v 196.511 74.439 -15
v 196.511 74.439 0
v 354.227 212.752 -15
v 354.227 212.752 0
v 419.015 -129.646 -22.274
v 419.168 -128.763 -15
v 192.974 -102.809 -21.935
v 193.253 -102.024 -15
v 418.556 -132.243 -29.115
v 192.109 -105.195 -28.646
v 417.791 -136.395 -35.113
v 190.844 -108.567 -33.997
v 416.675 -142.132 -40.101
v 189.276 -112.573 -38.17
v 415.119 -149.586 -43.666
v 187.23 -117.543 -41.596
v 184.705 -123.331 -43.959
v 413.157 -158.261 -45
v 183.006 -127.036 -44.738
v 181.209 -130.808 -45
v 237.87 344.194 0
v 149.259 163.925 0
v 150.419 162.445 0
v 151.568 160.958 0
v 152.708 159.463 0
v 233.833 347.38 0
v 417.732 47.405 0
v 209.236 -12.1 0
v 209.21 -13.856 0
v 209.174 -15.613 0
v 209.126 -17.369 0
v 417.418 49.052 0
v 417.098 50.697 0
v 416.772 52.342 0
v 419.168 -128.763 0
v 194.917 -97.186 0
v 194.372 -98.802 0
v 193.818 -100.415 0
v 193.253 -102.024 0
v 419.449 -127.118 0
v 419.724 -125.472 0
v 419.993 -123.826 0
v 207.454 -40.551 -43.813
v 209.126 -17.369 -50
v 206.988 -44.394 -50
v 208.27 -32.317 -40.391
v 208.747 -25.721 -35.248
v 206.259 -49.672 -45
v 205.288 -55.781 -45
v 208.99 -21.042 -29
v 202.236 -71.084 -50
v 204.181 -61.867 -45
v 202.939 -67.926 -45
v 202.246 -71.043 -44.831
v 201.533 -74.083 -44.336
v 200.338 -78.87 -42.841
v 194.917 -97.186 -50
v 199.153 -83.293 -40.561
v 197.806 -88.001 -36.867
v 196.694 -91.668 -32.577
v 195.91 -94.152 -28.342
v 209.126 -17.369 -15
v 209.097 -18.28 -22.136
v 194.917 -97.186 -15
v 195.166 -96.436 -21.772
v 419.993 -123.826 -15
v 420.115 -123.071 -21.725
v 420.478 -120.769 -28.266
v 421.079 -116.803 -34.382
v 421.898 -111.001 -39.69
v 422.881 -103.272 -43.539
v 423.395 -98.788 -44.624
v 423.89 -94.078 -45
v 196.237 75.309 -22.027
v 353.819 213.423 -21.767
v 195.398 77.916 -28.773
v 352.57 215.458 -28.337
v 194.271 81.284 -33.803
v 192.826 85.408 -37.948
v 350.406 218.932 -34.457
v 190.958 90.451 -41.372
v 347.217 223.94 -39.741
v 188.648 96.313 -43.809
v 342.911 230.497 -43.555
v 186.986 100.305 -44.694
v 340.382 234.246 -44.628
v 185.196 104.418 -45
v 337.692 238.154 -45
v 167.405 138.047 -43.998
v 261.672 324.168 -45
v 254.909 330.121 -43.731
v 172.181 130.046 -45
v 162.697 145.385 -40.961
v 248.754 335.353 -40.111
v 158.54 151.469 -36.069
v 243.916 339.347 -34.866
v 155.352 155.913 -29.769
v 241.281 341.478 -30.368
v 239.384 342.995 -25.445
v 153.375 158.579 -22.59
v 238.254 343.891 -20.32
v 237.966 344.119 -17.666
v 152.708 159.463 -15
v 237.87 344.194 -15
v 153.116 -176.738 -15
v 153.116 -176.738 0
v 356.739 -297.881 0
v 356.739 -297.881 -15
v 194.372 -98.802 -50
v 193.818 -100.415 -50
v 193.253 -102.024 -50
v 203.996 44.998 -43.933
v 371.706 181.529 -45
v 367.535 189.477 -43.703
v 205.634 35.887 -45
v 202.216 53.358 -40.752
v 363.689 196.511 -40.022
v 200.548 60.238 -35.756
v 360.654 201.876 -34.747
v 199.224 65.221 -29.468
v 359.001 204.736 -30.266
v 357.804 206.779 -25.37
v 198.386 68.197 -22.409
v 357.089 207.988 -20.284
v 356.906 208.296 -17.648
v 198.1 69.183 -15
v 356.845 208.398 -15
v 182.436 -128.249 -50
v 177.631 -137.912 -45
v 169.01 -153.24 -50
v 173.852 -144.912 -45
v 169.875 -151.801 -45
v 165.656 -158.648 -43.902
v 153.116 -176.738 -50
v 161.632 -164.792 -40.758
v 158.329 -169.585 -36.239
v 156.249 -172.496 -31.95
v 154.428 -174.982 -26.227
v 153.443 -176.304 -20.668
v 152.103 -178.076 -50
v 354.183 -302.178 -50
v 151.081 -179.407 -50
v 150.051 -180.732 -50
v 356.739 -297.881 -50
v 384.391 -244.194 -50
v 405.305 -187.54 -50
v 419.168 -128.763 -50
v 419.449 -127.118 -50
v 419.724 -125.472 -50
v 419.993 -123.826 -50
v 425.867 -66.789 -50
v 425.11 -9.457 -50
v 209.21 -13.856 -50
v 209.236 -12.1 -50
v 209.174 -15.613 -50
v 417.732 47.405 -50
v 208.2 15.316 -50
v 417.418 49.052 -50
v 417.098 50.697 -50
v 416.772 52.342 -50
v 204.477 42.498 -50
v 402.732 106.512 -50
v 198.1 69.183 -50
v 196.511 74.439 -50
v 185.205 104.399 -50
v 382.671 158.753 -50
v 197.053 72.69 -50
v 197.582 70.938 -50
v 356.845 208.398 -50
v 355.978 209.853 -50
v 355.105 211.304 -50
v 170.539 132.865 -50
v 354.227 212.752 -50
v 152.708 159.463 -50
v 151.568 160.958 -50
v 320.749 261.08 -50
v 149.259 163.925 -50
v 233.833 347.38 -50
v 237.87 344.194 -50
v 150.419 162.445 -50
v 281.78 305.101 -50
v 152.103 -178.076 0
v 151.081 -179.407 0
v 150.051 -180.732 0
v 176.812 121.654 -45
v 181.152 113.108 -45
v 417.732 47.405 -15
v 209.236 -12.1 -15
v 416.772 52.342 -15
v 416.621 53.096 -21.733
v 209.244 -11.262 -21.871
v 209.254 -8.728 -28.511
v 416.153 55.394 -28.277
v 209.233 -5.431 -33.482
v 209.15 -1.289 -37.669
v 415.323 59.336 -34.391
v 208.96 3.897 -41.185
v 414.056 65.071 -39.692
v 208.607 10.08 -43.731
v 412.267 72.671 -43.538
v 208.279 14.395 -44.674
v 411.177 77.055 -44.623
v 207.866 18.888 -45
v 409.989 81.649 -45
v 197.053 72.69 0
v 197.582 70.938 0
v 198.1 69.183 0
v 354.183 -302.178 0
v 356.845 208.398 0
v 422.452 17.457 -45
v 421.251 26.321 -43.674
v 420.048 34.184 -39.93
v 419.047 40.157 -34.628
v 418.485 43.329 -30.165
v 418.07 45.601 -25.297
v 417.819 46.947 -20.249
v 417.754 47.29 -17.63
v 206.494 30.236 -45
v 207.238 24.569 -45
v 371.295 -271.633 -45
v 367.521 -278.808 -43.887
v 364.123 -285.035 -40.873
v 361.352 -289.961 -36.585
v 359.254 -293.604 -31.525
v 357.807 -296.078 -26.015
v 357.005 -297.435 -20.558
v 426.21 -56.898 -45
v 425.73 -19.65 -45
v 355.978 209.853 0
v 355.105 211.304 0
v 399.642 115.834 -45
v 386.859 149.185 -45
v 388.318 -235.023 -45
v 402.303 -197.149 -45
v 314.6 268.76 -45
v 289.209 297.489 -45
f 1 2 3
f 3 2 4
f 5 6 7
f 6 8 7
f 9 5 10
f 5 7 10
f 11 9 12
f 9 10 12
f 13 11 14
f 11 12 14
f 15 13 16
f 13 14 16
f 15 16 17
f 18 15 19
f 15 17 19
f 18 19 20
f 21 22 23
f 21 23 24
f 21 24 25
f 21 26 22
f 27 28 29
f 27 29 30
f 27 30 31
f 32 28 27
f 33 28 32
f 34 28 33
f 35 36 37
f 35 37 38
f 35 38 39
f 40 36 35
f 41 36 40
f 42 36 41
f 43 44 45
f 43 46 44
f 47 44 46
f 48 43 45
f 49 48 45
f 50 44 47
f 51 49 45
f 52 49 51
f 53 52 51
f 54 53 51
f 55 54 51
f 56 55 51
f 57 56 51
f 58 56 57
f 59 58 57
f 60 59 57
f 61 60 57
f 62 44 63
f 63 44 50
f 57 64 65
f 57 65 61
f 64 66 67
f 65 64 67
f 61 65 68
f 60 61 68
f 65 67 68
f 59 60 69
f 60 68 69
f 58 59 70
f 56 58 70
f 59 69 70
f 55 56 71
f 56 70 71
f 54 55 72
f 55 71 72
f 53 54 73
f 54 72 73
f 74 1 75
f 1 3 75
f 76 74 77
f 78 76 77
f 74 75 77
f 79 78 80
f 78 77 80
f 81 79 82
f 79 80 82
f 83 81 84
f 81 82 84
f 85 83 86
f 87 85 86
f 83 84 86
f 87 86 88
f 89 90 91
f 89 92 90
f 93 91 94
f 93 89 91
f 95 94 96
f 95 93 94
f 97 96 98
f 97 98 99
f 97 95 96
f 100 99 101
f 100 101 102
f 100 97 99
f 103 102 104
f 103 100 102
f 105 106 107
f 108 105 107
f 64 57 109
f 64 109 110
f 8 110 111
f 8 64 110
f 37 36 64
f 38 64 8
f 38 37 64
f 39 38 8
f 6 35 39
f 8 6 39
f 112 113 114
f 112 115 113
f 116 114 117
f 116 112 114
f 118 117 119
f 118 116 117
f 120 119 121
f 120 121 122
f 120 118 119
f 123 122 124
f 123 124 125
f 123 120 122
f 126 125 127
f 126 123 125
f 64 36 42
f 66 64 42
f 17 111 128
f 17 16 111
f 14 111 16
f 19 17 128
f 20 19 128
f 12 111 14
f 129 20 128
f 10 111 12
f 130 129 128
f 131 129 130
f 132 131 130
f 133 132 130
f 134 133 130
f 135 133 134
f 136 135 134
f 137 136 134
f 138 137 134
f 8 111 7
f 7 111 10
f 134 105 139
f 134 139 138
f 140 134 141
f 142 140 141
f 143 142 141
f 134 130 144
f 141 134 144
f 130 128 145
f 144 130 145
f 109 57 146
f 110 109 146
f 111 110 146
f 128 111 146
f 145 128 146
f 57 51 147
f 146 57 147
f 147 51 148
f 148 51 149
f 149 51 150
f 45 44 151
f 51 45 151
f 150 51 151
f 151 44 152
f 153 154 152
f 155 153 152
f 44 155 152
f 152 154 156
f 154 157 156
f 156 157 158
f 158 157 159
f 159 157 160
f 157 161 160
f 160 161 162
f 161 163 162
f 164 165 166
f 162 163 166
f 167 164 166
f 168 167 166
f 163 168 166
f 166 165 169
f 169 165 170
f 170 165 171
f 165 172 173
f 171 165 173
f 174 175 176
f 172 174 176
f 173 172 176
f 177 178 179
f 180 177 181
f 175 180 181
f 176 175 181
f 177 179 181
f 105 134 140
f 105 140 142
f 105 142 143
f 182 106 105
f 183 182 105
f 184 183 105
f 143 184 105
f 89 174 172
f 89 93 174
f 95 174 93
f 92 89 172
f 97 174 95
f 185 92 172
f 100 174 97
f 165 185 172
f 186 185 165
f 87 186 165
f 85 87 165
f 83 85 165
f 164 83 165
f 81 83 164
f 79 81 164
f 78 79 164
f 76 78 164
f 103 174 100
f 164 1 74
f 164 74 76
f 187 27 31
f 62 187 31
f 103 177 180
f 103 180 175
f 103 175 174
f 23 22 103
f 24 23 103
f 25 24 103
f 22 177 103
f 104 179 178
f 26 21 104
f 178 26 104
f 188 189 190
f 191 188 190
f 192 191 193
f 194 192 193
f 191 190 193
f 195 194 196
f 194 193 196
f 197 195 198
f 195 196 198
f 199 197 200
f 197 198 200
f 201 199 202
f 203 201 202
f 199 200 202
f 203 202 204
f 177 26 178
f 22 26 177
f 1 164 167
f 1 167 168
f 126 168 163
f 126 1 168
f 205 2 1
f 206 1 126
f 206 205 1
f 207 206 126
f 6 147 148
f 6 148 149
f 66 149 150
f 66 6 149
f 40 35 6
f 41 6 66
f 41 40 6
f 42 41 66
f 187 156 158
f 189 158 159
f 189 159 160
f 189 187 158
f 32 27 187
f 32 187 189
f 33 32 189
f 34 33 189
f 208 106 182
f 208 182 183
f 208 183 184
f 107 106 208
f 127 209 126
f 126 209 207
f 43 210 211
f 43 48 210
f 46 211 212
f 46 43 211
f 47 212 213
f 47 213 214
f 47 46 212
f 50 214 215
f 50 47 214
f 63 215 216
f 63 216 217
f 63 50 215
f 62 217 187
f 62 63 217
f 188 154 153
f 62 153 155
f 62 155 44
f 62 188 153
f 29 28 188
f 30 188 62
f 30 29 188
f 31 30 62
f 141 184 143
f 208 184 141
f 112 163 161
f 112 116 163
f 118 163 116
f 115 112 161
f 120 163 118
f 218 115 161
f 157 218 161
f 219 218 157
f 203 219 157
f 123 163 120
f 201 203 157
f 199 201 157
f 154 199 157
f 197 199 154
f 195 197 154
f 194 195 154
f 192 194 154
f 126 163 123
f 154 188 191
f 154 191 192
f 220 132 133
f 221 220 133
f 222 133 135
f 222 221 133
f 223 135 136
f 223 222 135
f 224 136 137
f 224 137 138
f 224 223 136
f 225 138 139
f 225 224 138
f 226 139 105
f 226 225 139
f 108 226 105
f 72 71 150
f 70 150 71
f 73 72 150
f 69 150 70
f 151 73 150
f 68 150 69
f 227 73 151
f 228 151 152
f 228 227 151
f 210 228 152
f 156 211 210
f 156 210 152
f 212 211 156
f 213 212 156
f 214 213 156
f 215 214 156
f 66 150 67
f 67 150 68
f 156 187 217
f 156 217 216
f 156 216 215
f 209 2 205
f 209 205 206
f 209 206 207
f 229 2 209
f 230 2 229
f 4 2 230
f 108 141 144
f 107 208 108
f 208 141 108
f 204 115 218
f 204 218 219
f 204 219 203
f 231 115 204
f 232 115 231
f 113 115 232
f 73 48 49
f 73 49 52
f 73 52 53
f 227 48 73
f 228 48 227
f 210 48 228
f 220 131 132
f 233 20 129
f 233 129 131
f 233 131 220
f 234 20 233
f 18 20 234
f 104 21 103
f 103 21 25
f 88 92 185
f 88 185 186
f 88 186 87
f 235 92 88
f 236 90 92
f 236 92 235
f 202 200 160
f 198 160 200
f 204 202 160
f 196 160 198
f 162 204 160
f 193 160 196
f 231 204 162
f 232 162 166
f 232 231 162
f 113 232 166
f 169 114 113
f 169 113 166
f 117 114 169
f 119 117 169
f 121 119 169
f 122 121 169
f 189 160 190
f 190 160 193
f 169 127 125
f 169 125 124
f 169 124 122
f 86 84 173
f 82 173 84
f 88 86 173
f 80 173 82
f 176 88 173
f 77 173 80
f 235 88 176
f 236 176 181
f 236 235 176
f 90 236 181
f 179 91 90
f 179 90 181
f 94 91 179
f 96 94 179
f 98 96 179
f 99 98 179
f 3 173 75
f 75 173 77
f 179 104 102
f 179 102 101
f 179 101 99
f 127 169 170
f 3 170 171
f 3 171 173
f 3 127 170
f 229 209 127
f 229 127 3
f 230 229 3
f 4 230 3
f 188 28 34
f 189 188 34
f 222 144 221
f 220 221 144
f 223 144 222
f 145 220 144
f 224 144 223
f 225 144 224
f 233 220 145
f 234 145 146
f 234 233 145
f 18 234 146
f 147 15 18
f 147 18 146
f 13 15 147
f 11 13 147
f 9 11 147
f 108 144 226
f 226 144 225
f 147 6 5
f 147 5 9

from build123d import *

# Parameters (mm, degrees)
F1_DEPTH = 50
F2_DEPTH = 45
F3_R     = 30


with BuildPart() as f1:
    # F0 (on Top) → F1 (new body)
    with BuildSketch(Plane.XY):
        with BuildLine():
            ThreePointArc((194.916758, -97.186199), (194.096086, -99.609017), (193.25323, -102.024207))
            Line((193.25323, -102.024207), (419.168146, -128.763))
            ThreePointArc((419.168146, -128.763), (419.586918, -126.295419), (419.993217, -123.825754))
            Line((419.993217, -123.825754), (194.916758, -97.186199))
        make_face()
        with BuildLine():
            Line((419.168146, -128.763), (193.25323, -102.024207))
            ThreePointArc((193.25323, -102.024207), (176.040994, -140.915536), (153.116385, -176.738139))
            Line((153.116385, -176.738139), (356.739258, -297.881018))
            ThreePointArc((356.739258, -297.881018), (395.712182, -216.186004), (419.168146, -128.763))
        make_face()
        with BuildLine():
            Line((356.739258, -297.881018), (153.116385, -176.738139))
            ThreePointArc((153.116385, -176.738139), (151.592629, -178.742138), (150.050848, -180.732305))
            Line((150.050848, -180.732305), (354.182793, -302.17805))
            Line((354.182793, -302.17805), (356.739258, -297.881018))
        make_face()
        with BuildLine():
            ThreePointArc((209.125815, -17.369315), (204.936498, -57.796725), (194.916758, -97.186199))
            Line((194.916758, -97.186199), (419.993217, -123.825754))
            ThreePointArc((419.993217, -123.825754), (426.318532, -38.112086), (417.732158, 47.404677))
            Line((417.732158, 47.404677), (209.125815, -17.369315))
        make_face()
        with BuildLine():
            ThreePointArc((209.235921, -12.099633), (209.193315, -14.734734), (209.125815, -17.369315))
            Line((209.125815, -17.369315), (417.732158, 47.404677))
            ThreePointArc((417.732158, 47.404677), (417.258484, 49.874616), (416.772274, 52.342118))
            Line((416.772274, 52.342118), (209.235921, -12.099633))
        make_face()
        with BuildLine():
            ThreePointArc((198.100487, 69.182539), (206.672827, 28.953078), (209.235921, -12.099633))
            Line((209.235921, -12.099633), (416.772274, 52.342118))
            ThreePointArc((416.772274, 52.342118), (393.439703, 132.916412), (356.845379, 208.398073))
            Line((356.845379, 208.398073), (198.100487, 69.182539))
        make_face()
        with BuildLine():
            ThreePointArc((196.511281, 74.439195), (197.31882, 71.814778), (198.100487, 69.182539))
            Line((198.100487, 69.182539), (356.845379, 208.398073))
            ThreePointArc((356.845379, 208.398073), (355.541948, 210.578631), (354.227351, 212.752477))
            Line((354.227351, 212.752477), (196.511281, 74.439195))
        make_face()
        with BuildLine():
            ThreePointArc((152.708019, 159.463464), (178.280983, 118.842747), (196.511281, 74.439195))
            Line((196.511281, 74.439195), (354.227351, 212.752477))
            ThreePointArc((354.227351, 212.752477), (301.918092, 283.669214), (237.870183, 344.194478))
            Line((237.870183, 344.194478), (152.708019, 159.463464))
        make_face()
        with BuildLine():
            ThreePointArc((149.258975, 163.924782), (150.994771, 161.702839), (152.708019, 159.463464))
            Line((152.708019, 159.463464), (237.870183, 344.194478))
            Line((237.870183, 344.194478), (233.833063, 347.380159))
            Line((233.833063, 347.380159), (149.258975, 163.924782))
        make_face()
    extrude(amount=-F1_DEPTH)

    # F0 (on Top) → F2 (cut)
    with BuildSketch(Plane.XY):
        with BuildLine():
            Line((419.168146, -128.763), (193.25323, -102.024207))
            ThreePointArc((193.25323, -102.024207), (176.040994, -140.915536), (153.116385, -176.738139))
            Line((153.116385, -176.738139), (356.739258, -297.881018))
            ThreePointArc((356.739258, -297.881018), (395.712182, -216.186004), (419.168146, -128.763))
        make_face()
        with BuildLine():
            ThreePointArc((209.125815, -17.369315), (204.936498, -57.796725), (194.916758, -97.186199))
            Line((194.916758, -97.186199), (419.993217, -123.825754))
            ThreePointArc((419.993217, -123.825754), (426.318532, -38.112086), (417.732158, 47.404677))
            Line((417.732158, 47.404677), (209.125815, -17.369315))
        make_face()
        with BuildLine():
            ThreePointArc((198.100487, 69.182539), (206.672827, 28.953078), (209.235921, -12.099633))
            Line((209.235921, -12.099633), (416.772274, 52.342118))
            ThreePointArc((416.772274, 52.342118), (393.439703, 132.916412), (356.845379, 208.398073))
            Line((356.845379, 208.398073), (198.100487, 69.182539))
        make_face()
        with BuildLine():
            ThreePointArc((152.708019, 159.463464), (178.280983, 118.842747), (196.511281, 74.439195))
            Line((196.511281, 74.439195), (354.227351, 212.752477))
            ThreePointArc((354.227351, 212.752477), (301.918092, 283.669214), (237.870183, 344.194478))
            Line((237.870183, 344.194478), (152.708019, 159.463464))
        make_face()
    extrude(amount=-F2_DEPTH, mode=Mode.SUBTRACT)

    # F3
    f3_edges = [f1.edges().sort_by_distance(p)[0] for p in [
        (195.289101, 251.828971, -45),
        (275.369316, 143.595836, -45),
        (313.004098, 20.121242, -45),
        (307.454988, -110.505976, -45),
        (254.927822, -237.309578, -45),
        (277.472933, 138.790306, -45),
        (313.428987, 15.017681, -45),
        (306.210688, -115.393603, -45),
    ]]
    fillet(f3_edges, radius=F3_R)


solid = f1.part
